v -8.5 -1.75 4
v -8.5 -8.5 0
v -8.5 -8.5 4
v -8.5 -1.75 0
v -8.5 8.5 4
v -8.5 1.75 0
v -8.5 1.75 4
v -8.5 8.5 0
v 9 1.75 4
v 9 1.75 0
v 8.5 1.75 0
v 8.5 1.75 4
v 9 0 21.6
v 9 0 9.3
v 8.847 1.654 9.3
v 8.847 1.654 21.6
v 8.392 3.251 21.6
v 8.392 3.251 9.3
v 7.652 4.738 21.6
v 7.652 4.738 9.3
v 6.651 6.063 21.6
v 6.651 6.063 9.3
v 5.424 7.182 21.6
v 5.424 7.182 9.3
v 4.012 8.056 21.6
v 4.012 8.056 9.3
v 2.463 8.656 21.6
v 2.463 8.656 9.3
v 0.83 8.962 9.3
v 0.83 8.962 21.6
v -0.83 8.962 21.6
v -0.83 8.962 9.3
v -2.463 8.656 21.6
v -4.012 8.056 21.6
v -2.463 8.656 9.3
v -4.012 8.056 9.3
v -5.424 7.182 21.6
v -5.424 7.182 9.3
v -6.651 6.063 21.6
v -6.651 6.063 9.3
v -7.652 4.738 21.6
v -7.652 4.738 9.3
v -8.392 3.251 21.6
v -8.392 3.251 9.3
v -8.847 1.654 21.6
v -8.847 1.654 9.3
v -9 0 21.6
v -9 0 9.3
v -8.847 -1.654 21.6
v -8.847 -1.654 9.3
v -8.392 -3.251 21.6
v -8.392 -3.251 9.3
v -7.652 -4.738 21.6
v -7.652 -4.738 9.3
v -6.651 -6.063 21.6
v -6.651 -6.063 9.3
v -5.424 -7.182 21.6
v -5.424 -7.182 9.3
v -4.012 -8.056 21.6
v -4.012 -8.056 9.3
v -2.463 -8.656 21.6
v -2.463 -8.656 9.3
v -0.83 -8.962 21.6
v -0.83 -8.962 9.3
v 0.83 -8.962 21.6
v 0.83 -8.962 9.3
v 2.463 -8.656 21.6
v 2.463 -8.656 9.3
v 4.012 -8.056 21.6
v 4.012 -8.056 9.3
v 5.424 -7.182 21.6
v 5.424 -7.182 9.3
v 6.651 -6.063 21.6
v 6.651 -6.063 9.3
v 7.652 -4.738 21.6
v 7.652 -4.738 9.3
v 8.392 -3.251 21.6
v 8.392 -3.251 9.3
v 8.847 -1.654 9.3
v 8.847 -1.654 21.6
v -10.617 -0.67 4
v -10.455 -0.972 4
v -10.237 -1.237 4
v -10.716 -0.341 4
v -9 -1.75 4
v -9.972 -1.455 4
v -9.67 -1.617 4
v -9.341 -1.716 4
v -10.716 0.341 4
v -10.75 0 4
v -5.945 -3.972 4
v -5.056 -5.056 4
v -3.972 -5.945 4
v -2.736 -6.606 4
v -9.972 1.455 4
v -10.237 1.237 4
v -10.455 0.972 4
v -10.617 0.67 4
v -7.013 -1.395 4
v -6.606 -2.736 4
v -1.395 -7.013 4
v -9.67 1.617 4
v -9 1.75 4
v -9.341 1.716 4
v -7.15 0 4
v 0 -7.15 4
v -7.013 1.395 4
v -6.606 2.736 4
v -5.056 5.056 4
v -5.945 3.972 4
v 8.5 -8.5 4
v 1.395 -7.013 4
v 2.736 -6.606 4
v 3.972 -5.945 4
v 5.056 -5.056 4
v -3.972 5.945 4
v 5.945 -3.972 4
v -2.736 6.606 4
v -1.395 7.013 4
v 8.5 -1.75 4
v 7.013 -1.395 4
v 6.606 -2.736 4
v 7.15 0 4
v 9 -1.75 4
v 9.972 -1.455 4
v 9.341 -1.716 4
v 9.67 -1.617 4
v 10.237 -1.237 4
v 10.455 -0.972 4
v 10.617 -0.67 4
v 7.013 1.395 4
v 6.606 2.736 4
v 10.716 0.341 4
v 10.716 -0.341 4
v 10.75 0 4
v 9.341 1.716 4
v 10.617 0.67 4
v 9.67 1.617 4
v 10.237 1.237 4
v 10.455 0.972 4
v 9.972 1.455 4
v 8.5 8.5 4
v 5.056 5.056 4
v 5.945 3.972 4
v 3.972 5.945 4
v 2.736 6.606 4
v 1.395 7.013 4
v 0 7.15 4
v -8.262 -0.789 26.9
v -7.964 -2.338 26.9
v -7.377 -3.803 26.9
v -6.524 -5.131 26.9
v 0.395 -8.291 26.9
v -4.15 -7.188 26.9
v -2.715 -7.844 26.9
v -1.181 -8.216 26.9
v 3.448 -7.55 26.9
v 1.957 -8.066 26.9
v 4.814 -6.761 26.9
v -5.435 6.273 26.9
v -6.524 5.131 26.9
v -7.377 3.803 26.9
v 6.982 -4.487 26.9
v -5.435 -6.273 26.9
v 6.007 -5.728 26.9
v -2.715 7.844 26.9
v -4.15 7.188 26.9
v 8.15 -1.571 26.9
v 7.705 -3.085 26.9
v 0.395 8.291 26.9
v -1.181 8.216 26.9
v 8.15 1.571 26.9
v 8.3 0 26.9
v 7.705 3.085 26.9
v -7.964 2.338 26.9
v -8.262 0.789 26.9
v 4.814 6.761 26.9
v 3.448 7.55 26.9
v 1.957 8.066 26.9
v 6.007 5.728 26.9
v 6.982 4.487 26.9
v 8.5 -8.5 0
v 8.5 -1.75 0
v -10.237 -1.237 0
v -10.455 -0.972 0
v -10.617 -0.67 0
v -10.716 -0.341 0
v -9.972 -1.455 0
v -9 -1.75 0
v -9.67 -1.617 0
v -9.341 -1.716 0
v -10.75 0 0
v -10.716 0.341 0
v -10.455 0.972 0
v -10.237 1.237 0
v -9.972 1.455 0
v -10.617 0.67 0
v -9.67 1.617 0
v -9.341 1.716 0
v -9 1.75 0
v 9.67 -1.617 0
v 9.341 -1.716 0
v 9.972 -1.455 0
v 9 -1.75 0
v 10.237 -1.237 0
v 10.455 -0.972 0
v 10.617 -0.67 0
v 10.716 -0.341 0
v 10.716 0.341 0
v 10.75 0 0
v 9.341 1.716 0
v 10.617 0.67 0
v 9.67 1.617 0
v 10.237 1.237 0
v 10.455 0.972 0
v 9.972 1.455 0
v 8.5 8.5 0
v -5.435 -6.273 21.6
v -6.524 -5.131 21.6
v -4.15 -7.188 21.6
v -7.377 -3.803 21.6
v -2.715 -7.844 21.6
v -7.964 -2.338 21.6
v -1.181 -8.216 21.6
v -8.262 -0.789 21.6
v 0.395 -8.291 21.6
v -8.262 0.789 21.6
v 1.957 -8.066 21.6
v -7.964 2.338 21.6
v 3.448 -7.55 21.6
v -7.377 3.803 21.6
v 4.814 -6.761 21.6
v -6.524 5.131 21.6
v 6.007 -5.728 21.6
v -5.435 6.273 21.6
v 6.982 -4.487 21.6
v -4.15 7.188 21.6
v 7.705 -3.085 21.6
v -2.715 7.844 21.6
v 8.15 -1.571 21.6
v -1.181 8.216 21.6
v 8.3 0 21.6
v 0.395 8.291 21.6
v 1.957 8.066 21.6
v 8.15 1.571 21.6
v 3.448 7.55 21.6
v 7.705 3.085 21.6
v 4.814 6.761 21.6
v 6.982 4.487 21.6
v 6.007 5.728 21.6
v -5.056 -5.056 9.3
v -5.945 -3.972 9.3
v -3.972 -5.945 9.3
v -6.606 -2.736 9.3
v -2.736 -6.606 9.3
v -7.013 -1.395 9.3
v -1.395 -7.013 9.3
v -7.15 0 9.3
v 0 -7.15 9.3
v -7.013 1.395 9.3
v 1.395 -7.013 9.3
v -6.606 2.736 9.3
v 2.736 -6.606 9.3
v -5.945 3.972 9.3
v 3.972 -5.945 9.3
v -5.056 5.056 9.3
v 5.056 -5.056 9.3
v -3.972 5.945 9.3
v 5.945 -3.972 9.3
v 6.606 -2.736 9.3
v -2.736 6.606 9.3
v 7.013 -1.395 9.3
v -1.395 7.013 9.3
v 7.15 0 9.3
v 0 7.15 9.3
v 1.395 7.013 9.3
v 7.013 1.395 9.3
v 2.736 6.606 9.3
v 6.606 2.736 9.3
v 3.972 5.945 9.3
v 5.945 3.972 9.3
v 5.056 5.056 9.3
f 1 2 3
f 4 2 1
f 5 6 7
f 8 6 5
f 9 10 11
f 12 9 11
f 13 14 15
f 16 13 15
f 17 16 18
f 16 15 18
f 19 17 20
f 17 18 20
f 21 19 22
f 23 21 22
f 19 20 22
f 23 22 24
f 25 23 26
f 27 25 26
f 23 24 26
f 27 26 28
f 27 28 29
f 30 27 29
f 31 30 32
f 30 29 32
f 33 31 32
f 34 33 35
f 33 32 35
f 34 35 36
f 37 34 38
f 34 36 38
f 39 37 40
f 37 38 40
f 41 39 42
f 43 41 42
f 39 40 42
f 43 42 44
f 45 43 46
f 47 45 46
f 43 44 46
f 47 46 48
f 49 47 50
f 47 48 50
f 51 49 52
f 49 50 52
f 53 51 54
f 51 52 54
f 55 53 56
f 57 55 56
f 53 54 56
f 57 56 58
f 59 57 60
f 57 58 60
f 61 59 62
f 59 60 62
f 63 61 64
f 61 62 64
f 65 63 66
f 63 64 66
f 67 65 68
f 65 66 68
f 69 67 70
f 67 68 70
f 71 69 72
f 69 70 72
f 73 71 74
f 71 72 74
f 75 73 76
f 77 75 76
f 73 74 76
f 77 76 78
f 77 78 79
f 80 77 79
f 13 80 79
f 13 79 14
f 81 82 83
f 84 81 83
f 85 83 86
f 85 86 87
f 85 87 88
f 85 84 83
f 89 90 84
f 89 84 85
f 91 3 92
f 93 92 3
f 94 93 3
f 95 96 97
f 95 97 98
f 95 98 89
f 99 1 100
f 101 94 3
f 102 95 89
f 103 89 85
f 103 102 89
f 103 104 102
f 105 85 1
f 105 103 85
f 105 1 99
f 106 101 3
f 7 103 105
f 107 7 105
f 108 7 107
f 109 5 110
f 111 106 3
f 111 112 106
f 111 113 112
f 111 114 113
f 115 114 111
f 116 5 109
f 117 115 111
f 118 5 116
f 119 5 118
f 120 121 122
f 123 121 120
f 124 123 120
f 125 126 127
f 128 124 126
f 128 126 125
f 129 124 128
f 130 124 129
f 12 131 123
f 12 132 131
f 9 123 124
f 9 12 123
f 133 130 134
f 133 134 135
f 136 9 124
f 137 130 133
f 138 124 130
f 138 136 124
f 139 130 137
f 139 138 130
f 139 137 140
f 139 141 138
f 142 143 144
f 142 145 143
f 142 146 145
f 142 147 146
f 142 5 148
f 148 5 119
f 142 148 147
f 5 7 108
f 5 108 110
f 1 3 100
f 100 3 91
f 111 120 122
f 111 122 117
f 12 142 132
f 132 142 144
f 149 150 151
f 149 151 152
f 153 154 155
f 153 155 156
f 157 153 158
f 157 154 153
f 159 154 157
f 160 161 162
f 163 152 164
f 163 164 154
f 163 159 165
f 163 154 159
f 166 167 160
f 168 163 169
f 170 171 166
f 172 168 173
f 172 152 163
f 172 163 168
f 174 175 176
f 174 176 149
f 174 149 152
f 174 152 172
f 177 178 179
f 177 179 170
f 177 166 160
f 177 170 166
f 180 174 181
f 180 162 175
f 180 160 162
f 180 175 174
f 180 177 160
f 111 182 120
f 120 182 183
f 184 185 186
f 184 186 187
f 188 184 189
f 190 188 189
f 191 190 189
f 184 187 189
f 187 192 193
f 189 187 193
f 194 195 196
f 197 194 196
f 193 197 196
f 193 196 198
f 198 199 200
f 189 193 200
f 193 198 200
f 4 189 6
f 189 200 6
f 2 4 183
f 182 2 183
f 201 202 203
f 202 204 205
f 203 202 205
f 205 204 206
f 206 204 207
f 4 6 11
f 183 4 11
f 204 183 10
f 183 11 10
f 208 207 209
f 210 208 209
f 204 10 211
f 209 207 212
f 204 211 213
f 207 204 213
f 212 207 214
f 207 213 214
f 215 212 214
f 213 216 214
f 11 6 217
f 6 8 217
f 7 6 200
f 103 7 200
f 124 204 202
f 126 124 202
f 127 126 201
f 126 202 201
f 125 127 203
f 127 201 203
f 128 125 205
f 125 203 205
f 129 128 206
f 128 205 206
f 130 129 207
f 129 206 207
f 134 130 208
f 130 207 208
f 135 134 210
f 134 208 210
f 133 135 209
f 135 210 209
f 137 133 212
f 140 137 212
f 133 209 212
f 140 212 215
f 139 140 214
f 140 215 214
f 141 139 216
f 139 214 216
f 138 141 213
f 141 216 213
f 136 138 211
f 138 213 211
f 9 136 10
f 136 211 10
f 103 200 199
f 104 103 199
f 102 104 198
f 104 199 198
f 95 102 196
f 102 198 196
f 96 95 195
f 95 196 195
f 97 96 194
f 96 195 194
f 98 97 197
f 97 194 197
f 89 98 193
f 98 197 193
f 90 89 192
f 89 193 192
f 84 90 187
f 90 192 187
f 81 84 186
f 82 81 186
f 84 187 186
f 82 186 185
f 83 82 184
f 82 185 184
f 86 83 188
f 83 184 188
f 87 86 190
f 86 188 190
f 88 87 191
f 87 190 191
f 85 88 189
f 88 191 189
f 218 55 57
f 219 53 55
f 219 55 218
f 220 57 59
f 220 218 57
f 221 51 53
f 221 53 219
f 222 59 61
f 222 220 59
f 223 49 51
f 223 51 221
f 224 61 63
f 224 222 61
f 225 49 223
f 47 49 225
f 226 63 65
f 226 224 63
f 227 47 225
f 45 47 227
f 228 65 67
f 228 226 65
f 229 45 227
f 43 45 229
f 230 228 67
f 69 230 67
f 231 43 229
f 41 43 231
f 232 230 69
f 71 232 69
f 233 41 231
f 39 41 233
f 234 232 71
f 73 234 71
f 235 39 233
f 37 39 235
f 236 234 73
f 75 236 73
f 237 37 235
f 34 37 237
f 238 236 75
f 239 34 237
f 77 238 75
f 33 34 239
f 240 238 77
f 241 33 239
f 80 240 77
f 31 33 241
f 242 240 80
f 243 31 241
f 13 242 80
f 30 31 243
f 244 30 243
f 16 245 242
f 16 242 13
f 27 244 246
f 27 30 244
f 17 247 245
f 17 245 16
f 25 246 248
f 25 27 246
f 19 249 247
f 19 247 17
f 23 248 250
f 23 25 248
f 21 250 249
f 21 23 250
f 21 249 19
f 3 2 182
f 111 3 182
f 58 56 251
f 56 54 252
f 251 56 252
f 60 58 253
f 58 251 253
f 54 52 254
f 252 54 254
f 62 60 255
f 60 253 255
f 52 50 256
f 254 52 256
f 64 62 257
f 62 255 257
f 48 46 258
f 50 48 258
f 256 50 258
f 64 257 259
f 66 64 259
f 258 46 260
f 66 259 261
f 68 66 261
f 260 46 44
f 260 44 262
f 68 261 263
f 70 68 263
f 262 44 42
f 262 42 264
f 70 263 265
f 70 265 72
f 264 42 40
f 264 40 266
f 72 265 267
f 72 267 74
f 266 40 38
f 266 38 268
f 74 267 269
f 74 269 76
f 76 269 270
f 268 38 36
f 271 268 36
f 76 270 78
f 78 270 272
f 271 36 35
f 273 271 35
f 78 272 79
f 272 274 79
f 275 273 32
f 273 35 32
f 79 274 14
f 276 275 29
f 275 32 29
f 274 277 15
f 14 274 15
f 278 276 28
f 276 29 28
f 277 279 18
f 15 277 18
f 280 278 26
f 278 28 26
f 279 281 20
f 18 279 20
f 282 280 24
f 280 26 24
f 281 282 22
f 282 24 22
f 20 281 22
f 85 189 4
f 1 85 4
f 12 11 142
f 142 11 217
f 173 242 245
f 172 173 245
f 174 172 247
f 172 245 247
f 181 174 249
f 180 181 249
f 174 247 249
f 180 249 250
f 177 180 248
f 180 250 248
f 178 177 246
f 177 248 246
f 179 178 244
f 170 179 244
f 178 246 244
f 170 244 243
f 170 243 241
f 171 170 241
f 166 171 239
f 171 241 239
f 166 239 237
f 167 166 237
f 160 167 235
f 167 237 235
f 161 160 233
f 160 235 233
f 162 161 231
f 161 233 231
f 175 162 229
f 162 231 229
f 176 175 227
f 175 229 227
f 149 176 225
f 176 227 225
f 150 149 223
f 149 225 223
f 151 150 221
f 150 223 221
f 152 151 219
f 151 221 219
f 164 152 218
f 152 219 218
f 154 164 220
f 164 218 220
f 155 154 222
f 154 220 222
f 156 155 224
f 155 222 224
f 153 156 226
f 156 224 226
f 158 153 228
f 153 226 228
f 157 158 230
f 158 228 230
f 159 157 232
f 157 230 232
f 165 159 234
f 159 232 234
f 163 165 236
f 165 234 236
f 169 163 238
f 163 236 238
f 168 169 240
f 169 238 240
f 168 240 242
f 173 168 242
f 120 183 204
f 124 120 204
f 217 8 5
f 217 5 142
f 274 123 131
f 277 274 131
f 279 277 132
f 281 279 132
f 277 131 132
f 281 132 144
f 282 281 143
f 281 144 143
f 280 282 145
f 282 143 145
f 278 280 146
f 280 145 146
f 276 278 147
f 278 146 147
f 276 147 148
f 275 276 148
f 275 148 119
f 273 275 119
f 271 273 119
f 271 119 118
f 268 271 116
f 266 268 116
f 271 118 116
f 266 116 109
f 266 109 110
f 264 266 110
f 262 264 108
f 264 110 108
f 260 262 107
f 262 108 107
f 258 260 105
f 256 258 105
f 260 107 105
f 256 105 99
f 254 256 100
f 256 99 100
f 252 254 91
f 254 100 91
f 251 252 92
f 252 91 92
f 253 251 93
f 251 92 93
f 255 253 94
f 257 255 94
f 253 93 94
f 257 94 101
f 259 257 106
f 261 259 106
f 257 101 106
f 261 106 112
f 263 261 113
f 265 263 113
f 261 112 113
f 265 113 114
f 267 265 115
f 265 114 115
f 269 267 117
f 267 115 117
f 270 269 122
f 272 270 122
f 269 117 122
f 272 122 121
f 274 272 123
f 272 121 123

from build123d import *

# Parameters (mm, degrees)
SKETCH2_W           = 17
SKETCH2_H           = 3.5
SKETCH2_H_2         = 6.75
BOSS_EXTRUDE1_DEPTH = 4
SKETCH3_R           = 7.15
BOSS_EXTRUDE2_DEPTH = 5.3
SKETCH4_R           = 9
BOSS_EXTRUDE3_DEPTH = 12.3
SKETCH5_R           = 8.3
BOSS_EXTRUDE4_DEPTH = 5.3


with BuildPart() as part:
    # Sketch2 → Boss-Extrude1 (new body)
    with BuildSketch(Plane.XY):
        Rectangle(SKETCH2_W, SKETCH2_H)
        with BuildLine():
            Line((-9, -1.75), (-8.5, -1.75))
            Line((-8.5, -1.75), (-8.5, 1.75))
            Line((-8.5, 1.75), (-9, 1.75))
            ThreePointArc((-9, 1.75), (-10.75, 0), (-9, -1.75))
        make_face()
        with Locations((0, 5.125)):
            Rectangle(SKETCH2_W, SKETCH2_H_2)
        with Locations((0, -5.125)):
            Rectangle(SKETCH2_W, SKETCH2_H_2)
        with BuildLine():
            Line((8.5, 1.75), (8.5, -1.75))
            Line((8.5, -1.75), (9, -1.75))
            ThreePointArc((9, -1.75), (10.75, 0), (9, 1.75))
            Line((9, 1.75), (8.5, 1.75))
        make_face()
    extrude(amount=BOSS_EXTRUDE1_DEPTH)

    # Sketch3 → Boss-Extrude2 (add)
    with BuildSketch(Plane.XY.offset(4)):
        Circle(SKETCH3_R)
    extrude(amount=BOSS_EXTRUDE2_DEPTH)

    # Sketch4 → Boss-Extrude3 (add)
    with BuildSketch(Plane.XY.offset(9.3)):
        Circle(SKETCH4_R)
    extrude(amount=BOSS_EXTRUDE3_DEPTH)

    # Sketch5 → Boss-Extrude4 (add)
    with BuildSketch(Plane.XY.offset(21.6)):
        Circle(SKETCH5_R)
    extrude(amount=BOSS_EXTRUDE4_DEPTH)


solid = part.part
